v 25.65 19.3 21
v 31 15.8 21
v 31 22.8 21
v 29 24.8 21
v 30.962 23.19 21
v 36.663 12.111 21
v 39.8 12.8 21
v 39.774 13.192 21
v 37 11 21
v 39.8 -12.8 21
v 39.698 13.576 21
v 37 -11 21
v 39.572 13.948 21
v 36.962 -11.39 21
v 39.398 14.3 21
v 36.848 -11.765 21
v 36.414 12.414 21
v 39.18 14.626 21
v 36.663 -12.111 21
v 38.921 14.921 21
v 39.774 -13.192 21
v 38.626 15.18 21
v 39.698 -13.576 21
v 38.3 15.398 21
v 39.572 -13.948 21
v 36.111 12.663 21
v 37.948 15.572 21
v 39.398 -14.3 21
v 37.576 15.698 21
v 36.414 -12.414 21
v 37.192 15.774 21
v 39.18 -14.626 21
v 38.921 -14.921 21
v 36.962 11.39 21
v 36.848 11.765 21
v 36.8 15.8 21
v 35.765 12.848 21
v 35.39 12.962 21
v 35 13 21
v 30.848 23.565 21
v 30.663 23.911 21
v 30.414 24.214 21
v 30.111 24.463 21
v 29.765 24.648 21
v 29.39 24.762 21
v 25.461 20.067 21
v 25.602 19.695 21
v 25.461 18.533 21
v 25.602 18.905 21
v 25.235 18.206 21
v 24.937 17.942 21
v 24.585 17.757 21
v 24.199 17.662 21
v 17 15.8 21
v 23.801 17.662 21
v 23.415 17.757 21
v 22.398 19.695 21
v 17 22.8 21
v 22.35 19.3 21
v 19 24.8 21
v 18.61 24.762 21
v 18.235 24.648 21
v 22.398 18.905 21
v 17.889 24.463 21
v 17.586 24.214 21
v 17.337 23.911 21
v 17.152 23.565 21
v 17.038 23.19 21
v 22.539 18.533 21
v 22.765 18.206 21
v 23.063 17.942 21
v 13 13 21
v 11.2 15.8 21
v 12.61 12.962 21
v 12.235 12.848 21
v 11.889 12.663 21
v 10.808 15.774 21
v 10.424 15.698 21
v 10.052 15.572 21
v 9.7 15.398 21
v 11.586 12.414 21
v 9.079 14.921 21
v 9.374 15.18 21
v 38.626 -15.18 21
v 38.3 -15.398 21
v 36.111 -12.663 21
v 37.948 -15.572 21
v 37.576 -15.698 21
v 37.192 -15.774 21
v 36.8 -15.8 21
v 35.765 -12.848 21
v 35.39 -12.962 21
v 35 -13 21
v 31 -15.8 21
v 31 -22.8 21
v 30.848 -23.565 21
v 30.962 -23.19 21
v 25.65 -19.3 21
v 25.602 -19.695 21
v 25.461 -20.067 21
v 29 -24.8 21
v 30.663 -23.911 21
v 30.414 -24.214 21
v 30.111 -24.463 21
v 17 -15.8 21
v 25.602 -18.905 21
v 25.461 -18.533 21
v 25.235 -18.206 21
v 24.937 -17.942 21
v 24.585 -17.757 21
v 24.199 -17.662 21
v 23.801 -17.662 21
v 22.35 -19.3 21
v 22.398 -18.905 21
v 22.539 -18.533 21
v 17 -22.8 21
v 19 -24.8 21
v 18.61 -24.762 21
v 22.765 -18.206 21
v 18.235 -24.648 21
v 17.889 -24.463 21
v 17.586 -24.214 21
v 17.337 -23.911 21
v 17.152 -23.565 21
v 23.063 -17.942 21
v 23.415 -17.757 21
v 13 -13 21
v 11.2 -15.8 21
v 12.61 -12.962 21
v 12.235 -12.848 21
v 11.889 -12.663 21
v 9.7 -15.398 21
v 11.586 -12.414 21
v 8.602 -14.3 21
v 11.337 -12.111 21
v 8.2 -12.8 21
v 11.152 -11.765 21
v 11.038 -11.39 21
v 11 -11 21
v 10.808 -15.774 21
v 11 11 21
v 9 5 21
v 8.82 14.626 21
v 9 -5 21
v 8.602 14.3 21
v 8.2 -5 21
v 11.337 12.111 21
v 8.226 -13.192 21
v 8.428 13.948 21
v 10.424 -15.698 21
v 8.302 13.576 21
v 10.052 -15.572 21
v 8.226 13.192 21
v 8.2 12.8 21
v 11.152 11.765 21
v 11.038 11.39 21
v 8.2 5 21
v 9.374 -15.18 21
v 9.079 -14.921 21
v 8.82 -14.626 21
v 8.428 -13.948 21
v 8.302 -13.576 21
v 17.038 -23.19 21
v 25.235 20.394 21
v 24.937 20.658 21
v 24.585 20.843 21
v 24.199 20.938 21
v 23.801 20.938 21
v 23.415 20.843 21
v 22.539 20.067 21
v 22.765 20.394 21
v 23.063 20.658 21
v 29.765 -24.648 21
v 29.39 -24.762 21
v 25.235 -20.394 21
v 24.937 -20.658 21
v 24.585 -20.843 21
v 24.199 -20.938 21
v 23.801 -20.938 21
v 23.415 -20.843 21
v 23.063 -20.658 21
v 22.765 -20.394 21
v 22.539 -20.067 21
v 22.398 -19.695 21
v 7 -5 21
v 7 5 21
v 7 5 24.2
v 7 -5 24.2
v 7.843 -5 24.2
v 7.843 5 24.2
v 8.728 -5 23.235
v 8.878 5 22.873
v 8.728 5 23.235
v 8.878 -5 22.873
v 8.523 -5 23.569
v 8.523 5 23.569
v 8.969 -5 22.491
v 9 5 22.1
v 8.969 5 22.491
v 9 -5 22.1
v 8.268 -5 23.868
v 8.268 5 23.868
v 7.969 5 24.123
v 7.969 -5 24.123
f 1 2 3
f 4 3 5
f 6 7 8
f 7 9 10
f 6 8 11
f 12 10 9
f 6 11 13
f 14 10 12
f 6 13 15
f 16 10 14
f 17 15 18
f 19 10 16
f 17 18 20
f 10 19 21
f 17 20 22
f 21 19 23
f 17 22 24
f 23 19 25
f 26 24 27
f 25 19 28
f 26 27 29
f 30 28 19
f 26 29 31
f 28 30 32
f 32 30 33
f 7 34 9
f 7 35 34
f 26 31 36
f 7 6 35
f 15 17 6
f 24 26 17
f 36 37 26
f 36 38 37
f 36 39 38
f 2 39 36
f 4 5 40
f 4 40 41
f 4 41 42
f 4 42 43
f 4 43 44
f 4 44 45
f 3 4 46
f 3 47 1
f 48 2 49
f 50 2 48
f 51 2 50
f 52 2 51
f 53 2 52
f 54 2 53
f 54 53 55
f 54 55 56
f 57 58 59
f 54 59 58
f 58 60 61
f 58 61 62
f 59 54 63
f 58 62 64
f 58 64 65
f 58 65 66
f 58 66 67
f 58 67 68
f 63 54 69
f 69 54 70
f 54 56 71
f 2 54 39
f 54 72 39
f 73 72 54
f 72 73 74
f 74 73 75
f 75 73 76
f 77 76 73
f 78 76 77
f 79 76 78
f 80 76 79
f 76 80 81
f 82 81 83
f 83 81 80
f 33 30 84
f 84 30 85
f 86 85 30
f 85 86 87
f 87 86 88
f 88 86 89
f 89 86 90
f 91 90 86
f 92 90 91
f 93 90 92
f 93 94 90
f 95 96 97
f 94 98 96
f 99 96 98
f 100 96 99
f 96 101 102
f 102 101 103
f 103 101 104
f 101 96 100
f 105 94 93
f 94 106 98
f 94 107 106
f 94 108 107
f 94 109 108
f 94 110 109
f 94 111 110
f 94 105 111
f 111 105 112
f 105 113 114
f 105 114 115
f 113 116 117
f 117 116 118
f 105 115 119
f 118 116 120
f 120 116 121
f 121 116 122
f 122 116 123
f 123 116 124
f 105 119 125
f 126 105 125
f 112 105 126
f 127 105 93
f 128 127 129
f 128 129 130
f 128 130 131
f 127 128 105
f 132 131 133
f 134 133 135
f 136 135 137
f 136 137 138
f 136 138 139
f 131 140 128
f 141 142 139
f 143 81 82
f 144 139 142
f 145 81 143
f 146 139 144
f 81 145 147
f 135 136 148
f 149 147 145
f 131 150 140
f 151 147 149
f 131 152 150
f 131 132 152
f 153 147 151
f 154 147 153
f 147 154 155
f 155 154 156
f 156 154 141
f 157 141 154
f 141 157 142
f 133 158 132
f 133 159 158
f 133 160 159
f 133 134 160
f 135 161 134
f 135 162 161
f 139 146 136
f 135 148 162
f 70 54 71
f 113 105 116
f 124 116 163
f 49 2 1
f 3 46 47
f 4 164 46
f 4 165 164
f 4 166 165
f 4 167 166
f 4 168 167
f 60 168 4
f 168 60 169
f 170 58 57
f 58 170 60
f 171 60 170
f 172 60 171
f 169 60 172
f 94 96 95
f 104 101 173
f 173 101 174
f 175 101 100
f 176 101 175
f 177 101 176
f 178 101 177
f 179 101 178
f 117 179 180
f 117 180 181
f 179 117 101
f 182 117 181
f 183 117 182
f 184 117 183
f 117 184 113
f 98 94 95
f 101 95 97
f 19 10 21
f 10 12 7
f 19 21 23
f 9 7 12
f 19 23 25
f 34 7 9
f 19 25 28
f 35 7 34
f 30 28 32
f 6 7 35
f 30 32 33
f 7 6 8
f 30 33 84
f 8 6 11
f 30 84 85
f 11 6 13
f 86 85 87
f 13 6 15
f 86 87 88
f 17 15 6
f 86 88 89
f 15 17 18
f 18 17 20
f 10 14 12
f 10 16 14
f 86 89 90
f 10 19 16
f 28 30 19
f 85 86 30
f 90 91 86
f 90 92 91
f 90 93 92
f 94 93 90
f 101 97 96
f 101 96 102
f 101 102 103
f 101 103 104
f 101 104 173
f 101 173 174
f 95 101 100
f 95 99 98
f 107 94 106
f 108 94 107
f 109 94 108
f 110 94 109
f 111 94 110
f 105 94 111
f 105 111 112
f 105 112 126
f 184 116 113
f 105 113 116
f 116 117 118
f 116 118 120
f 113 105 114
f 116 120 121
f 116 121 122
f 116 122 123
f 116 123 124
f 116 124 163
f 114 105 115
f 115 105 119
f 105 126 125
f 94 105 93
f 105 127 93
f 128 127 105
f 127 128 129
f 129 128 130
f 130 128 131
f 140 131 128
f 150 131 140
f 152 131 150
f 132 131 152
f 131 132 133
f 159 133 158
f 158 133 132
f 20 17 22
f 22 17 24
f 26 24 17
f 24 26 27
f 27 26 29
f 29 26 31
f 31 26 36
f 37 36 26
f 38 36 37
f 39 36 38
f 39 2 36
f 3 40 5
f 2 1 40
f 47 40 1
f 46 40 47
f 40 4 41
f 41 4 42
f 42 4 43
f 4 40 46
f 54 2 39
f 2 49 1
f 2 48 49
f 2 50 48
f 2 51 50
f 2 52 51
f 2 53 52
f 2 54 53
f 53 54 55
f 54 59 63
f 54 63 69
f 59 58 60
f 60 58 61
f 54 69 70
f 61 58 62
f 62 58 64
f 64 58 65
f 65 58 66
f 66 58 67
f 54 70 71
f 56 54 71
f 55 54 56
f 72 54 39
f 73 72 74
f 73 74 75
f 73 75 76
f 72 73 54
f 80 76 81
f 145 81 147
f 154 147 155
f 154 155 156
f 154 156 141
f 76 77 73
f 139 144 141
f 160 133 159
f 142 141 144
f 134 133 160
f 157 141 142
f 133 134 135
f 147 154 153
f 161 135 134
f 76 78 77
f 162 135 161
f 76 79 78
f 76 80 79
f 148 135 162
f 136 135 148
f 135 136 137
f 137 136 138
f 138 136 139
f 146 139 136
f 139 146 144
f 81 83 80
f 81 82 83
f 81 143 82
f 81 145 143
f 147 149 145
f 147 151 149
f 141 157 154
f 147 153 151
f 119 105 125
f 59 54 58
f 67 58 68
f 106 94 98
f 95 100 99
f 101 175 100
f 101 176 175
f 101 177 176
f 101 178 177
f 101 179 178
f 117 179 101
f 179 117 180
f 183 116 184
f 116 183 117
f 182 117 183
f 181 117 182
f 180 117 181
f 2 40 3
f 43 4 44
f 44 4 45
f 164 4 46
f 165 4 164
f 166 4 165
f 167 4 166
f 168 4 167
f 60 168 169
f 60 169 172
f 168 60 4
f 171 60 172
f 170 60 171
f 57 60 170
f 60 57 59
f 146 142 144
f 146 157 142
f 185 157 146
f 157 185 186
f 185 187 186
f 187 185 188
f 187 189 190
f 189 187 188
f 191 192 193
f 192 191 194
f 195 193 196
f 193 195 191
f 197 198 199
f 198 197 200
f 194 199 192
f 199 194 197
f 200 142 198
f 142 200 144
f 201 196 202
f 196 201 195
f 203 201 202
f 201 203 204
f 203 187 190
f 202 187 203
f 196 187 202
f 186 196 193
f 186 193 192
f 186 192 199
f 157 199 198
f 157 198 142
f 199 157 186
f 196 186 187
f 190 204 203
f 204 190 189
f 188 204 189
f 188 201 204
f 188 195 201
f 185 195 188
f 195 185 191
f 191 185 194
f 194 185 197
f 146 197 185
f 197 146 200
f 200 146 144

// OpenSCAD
// file: saddle_cap.scad
// =====================================================================
//  AquaFeeder -- tampa do berco (fecha o tubo contra a bracadeira)
//  Imprimir EM PE como sai daqui (perfil constante, zero suporte).
//  4x M3 x 16mm roscam direto na bracadeira.
// =====================================================================
include <common.scad>

brk_w       = 9;      // so cabe a janela livre do tubo (x 40..49)
cradle_wall = 4.0;
ear_u       = 6.6;
cr_out      = barrel_od/2 + cradle_wall;
bolt_z      = [brk_w/2];

module cap_profile() {
    difference() {
        union() {
            circle(r = cr_out);
            translate([-cr_out - ear_u, 0]) square([2*(cr_out + ear_u), 7]);
        }
        circle(r = barrel_od/2 + 0.3 + fit/2);
        translate([-40, -40]) square([80, 40]);   // remove tudo abaixo do eixo
    }
}

module saddle_cap() {
    difference() {
        linear_extrude(brk_w) cap_profile();
        for (z = bolt_z, s = [-1, 1])
            translate([s * (cr_out + ear_u/2), 8, z])
                rotate([90, 0, 0]) cylinder(d = m3_free + fit, h = 11);
    }
}

saddle_cap();
// file: bracket.scad
// =====================================================================
//  AquaFeeder -- bracadeira da borda do aquario + mastro + berco do tubo
//
//  A peca e um PERFIL CONSTANTE extrudado 40mm: imprima EM PE, como sai
//  deste arquivo. Zero suporte, zero overhang, maxima resistencia.
//
//  Sistema de coordenadas LOCAL (= orientacao de impressao):
//     x local = eixo Y da montagem  (positivo = para dentro do aquario)
//     y local = eixo Z da montagem  (0 = topo da borda do aquario)
//     z local = eixo X da montagem  (comprimento do tubo)
//
//  AJUSTE PRINCIPAL: mast_h define a altura do eixo do tubo acima da borda.
//  A calha termina ~36mm abaixo do eixo. Com mast_h=46 a saida fica ~10mm
//  ACIMA do nivel da borda. Aumente se seu aquario tem a agua muito alta.
// =====================================================================
include <common.scad>

brk_w      = 38;    // largura (ao longo do tubo) -- berco vai de x=11 a x=49
rim_slot   = 24;    // vao da garra (borda de ate ~22mm + parafuso)
jaw_t      = 5;
web_t      = 12;
mast_t     = 8;
mast_h     = 46;    // topo da borda -> eixo do tubo
tube_y     = 52;    // eixo do tubo, medido da face interna da borda
cradle_wall= 4.0;
arm_h      = 13;

cr_out = barrel_od/2 + cradle_wall;   // 14.4
ear_u  = 6.6;                         // saliencia das orelhas do berco
// A tampa do berco cabe so na janela livre do tubo (x 40..49), entao ha
// UM par de parafusos, no meio dessa janela: x=44.5 -> local z=33.5
bolt_z = [33.5];

// ---------------------------------------------------------------------
module brk_profile() {
  difference() {
    union() {
        // garra interna (lado da agua)
        translate([-1, -web_t - clamp_depth]) square([jaw_t + 1, clamp_depth]);
        // garra externa
        translate([-1 - rim_slot - jaw_t, -web_t - clamp_depth]) square([jaw_t, clamp_depth]);
        // teto da garra
        translate([-1 - rim_slot - jaw_t, -web_t]) square([rim_slot + 2*jaw_t + 1, web_t]);
        // boss da porca M4
        translate([-1 - rim_slot - jaw_t - 6, -36]) square([6.1, 15]);
        // mastro
        translate([-mast_t/2, 0]) square([mast_t, mast_h]);
        // reforco mastro/teto
        polygon([[-mast_t/2, 0], [-mast_t/2, 18], [-22, 0]]);
        // braco
        translate([-mast_t/2, mast_h - arm_h]) square([tube_y + mast_t/2, arm_h]);
        // reforco do braco
        polygon([[mast_t/2, mast_h - arm_h], [mast_t/2, 12], [24, mast_h - arm_h]]);
        // berco + orelhas dos parafusos da tampa
        translate([tube_y, mast_h]) circle(r = cr_out);
        translate([tube_y - cr_out - ear_u, mast_h - 7]) square([2*(cr_out + ear_u), 7]);
    }
    // furo do tubo e corte de tudo que passa do eixo (a tampa fecha por cima)
    translate([tube_y, mast_h]) circle(r = barrel_od/2 + 0.3 + fit/2);
    translate([tube_y - 40, mast_h]) square([80, 40]);
  }
}

module bracket() {
    difference() {
        linear_extrude(brk_w) brk_profile();

        // parafusos M3 que prendem a tampa do berco (roscados na peca)
        for (z = bolt_z, s = [-1, 1])
            translate([tube_y + s*(cr_out + ear_u/2), mast_h + 1, z])
                rotate([90, 0, 0]) cylinder(d = m3_tap, h = 9);

        // parafuso de aperto M4 + alojamento da porca
        translate([-1 - rim_slot - jaw_t - 7, -28, brk_w/2]) rotate([0, 90, 0]) {
            cylinder(d = m4_free + fit, h = 20);
            rotate([0, 0, 30]) nut_trap(m4_nut_af + 0.25, m4_nut_t + 0.2);
        }

        // fixacao da caixa de eletronica no mastro (M4 auto-atarraxante)
        for (v = [10, 26])
            translate([-mast_t/2 - 1, v, brk_w/2]) rotate([0, 90, 0])
                cylinder(d = 3.6, h = mast_t + 2);
    }
}

bracket();
// file: auger.scad
// =====================================================================
//  AquaFeeder -- rosca sem-fim (auger)
//  Imprimir EM PE (como esta), cubo para baixo. Sem suporte.
//  0.2 mm de camada / 3 paredes / 30% preenchimento / PETG
// =====================================================================
include <common.scad>

// helice: um setor de coroa circular extrudado com twist gera o helicoide.
// angulo do setor = 360 * espessura_da_aleta / passo
module auger_flight(len) {
    ang   = 360 * flight_t / auger_pitch;
    twist = -360 * len / auger_pitch;
    // slices menor = render mais rapido; 0.6mm por fatia ja fica liso
    linear_extrude(height = len, twist = twist, slices = ceil(len / 0.6), convexity = 8, $fn = 40)
        union() {
            circle(d = auger_core);
            intersection() {
                difference() {
                    circle(d = auger_od);
                    circle(d = auger_core - 3);   // encrava a aleta ~1.5mm no nucleo (mais forte)
                }
                pie(auger_od, ang);
            }
        }
}

// furo do parafuso de fixacao do eixo + rebaixo p/ a cabeca na boca externa.
// Desenhado ao longo de +Z: a boca fica na superficie do cubo (raio hub_d/2).
module shaft_screw() {
    cylinder(d = m3_tap, h = hub_d);                          // furo rosqueado
    translate([0, 0, hub_d/2 - n17_screw_head_h])
        cylinder(d = n17_screw_head_d, h = hub_d);            // rebaixo da cabeca
}

module auger() {
    total = hub_len + auger_len + stub_len;
    difference() {
        union() {
            cylinder(d = hub_d, h = hub_len);                          // mancal dianteiro
            cylinder(d = auger_core, h = hub_len + auger_len);         // nucleo
            translate([0, 0, hub_len]) auger_flight(auger_len);        // helice
            translate([0, 0, hub_len + auger_len])                     // mancal traseiro
                cylinder(d = stub_d, h = stub_len);
        }
        // encaixe do eixo do motor
        if (motor_type == "NEMA17") {
            // Encaixe em "D": acompanha o achatado do eixo com folga de deslize
            // (ver n17_socket_c). A face plana pega o torque -- assim a rosca
            // encaixa firme e nao depende do parafuso para nao patinar.
            translate([0, 0, -eps])
                n17_dsocket(n17_socket_d + eps, n17_socket_c + fit/2);
            // DOIS parafusos M3 radiais a 90 graus: o em X cai sobre o achatado
            // (trava axial + reforca o aperto); o em Y e opcional. O torque quem
            // segura e o achatado do encaixe, nao os parafusos.
            translate([0, 0, 7])  rotate([0, 90, 0]) shaft_screw();
            translate([0, 0, 12]) rotate([90, 0, 0]) shaft_screw();
        } else {
            translate([0, 0, -eps]) dshaft(socket_depth + eps, 0.15 + fit/2);
        }

        // chanfro na base (evita pe de elefante travando no tubo)
        difference() {
            translate([0, 0, -eps]) cylinder(d = hub_d + 4, h = 0.9);
            cylinder(d1 = hub_d - 1.8, d2 = hub_d + 0.9, h = 1.0);
        }
    }
    // marca visual do sentido de giro (nao funcional)
}

auger();
// file: chute.scad
// =====================================================================
//  AquaFeeder -- calha de saida (encaixa por pressao no boss do tubo)
//  Joga a racao para frente e para longe do tubo (menos vapor subindo).
//  Imprimir COMO ESTA. Sem suporte. 3 paredes.
// =====================================================================
include <common.scad>

// Sensor de graos (opcional): abre dois furos de 3.4mm frente/tras para
// encaixar um LED IR de 3mm de um lado e um fototransistor do outro. O feixe
// atravessa o duto e cada grao que passa gera um pulso.
// Deixe false se nao vai usar sensor -- furo aberto deixa escapar racao.
sensor_holes = false;

// 5.6 fazia as paredes do socket baterem 0.6mm na barriga do tubo: a calha
// parava antes de assentar. Medido com cad/check_interferencia.scad.
socket_d = 4.8;                       // profundidade do encaixe
h_duct   = 26;                        // altura do duto
off_y    = 10;                        // deslocamento lateral (inclinacao)
sw       = 2.6;                       // parede do socket

sk_x = boss_x + 0.6 + 2*sw;           // 23.8
sk_y = boss_y + 0.6 + 2*sw;           // 26.8

module chute() {
    difference() {
        union() {
            translate([0, 0, h_duct]) rbox(sk_x, sk_y, socket_d, 3);
            hull() {
                translate([0, 0, h_duct - 0.01]) rbox(sk_x, sk_y, 0.01, 3);
                translate([0, off_y, 0])         rbox(22, 24, 0.01, 3);
            }
        }
        // cavidade do encaixe
        translate([0, 0, h_duct - eps])
            rbox(boss_x + 0.5 + fit, boss_y + 0.5 + fit, socket_d + 1, 2);
        // covinhas que travam nas meias-esferas do tubo
        for (s = [-1, 1])
            translate([0, s * (boss_y + 0.5)/2, h_duct + 2.6]) sphere(r = 2.0);
        // duto interno
        hull() {
            translate([0, 0, h_duct - 0.01]) rbox(boss_x + 0.5, boss_y + 0.5, 0.02, 2);
            translate([0, off_y, -1])        rbox(15.5, 17, 1.02, 2);
        }
        // furos do sensor optico (atravessam o duto)
        if (sensor_holes)
            translate([-16, off_y/2, 13]) rotate([0, 90, 0]) cylinder(d = 3.4, h = 32);
    }
}

chute();
// file: hopper.scad
// =====================================================================
//  AquaFeeder -- funil (reservatorio de racao) ~300 ml
//  Imprimir COMO ESTA (spigot para baixo). SEM SUPORTE.
//  PETG, 0.2mm, 3 paredes, 15% -- paredes finas, nao precisa forca.
//
//  ATENCAO: esta e a UNICA peca que pede suporte, e so embaixo do flange
//  (uma aba de 3,2mm que salta 13mm do pescoco, a 10mm da mesa). Area pequena
//  e plana, facil de tirar. Ja tentei eliminar com um chanfro de 40 graus, mas
//  isso obrigava as orelhas do colar a subir e elas colidiam com o chanfro --
//  ver cad/check_interferencia.scad.
// =====================================================================
include <common.scad>

// z = 0 e a face INFERIOR do flange (o que apoia nas orelhas do colar)
spig_z0   = -hop_spig_h;                 // -19
body_z0   = hop_flg_t;                   // 3.2
body_z1   = body_z0 + hop_taper_h;       // 98.2
rim_z0    = body_z1;
rim_z1    = body_z1 + hop_rim;

in_bot    = hop_bot - 2*hop_wall;        // 21.2
in_top    = hop_top - 2*hop_wall;        // 81.6

module hopper() {
    difference() {
        union() {
            // spigot: entra no socket do colar
            translate([0, 0, spig_z0]) rbox(hop_bot, hop_bot, hop_insert, 3);
            // flange (apoia no topo do colar; pede suporte embaixo)
            rbox(hop_flg_x, hop_flg_y, hop_flg_t, 3);
            // corpo troncoconico
            translate([0, 0, body_z0])
                linear_extrude(hop_taper_h, scale = hop_top / hop_bot)
                    rrect(hop_bot, hop_bot, 3);
            // aro de reforco no topo. O chanfro comeca EXATAMENTE na superficie
            // do corpo (86mm), senao sobra um degrau virado para baixo e o
            // fatiador pede suporte ali.
            hull() {
                translate([0, 0, rim_z0 - 0.01])
                    linear_extrude(0.01) rrect(hop_top, hop_top, 8);
                translate([0, 0, rim_z0 + hop_rim_ch])
                    linear_extrude(0.01) rrect(hop_top + 4, hop_top + 4, 8);
            }
            translate([0, 0, rim_z0 + hop_rim_ch]) linear_extrude(hop_rim)
                rrect(hop_top + 4, hop_top + 4, 8);
        }
        // cavidade reta no pescoco (spigot + chanfro + flange)
        translate([0, 0, spig_z0 - 1])
            rbox(in_bot, in_bot, hop_spig_h + hop_flg_t + 1, 2);
        // cavidade troncoconica
        translate([0, 0, body_z0 - eps])
            linear_extrude(hop_taper_h + hop_rim_ch + hop_rim + 2*eps,
                           scale = in_top / in_bot)
                rrect(in_bot, in_bot, 2);
        // furos M3 -> orelhas do colar (parafuso cabeca panela, sem rebaixo)
        for (s = [-1, 1])
            translate([0, s * lug_y, -1])
                cylinder(d = m3_free + fit, h = hop_flg_t + 2);
    }
}

hopper();
// file: barrel.scad
// =====================================================================
//  AquaFeeder -- tubo transportador, partido ao meio no plano y=0
//
//  openscad -o barrel_a.stl -D 'PART="A"' barrel.scad
//  openscad -o barrel_b.stl -D 'PART="B"' barrel.scad
//
//  A = metade com roscas M3 (furo 2.55)   B = metade com furos passantes
//  Imprimir com a face plana na mesa (a orientacao ja sai pronta). SEM SUPORTE.
//  4 paredes / 25% / PETG.
// =====================================================================
include <common.scad>

PART  = "A";
PRINT = true;

ear_z0   = 5;
ear_z1   = barrel_od/2 + ear_out;
ear_screw_z = 15.5;
outlet_cx   = outlet_x0 + outlet_len/2;
boss_z0     = -barrel_od/2 - boss_h;

// posicao das orelhas: [x0, lado]  (+1 = topo, -1 = fundo)
ears = [[0, 1], [0, -1], [barrel_len - ear_w, 1]];

// ---------------------------------------------------------------------
module ear(x0, s) {
    rotate([90, 0, 0])
        linear_extrude(height = 2*ear_t, center = true)
            translate([x0 + ear_w/2, s * (ear_z0 + ear_z1)/2])
                rrect(ear_w, ear_z1 - ear_z0, 2.5);
}

module ear_screw(x0, s, part) {
    translate([x0 + ear_w/2, 0, s * ear_screw_z]) rotate([-90, 0, 0]) {
        if (part == "A") {
            translate([0, 0, -0.2]) cylinder(d = m3_tap, h = ear_t + 0.4);
        } else {
            translate([0, 0, -ear_t - 0.2]) cylinder(d = m3_free + fit, h = ear_t + 0.4);
            translate([0, 0, -ear_t - 0.2]) cylinder(d = m3_head, h = m3_head_h + 0.2);
        }
    }
}

// ---------------------------------------------------------------------
// Fixacao do motor -- muda conforme motor_type (ver common.scad)
module motor_plate() {
    if (motor_type == "NEMA17") {
        translate([-n17_plate_t, 0, 0]) rotate([0, 90, 0])
            linear_extrude(n17_plate_t) rrect(n17_plate, n17_plate, 5);
    } else {
        translate([-plate_t, 0, plate_dz]) rotate([0, 90, 0])
            linear_extrude(plate_t) rrect(plate_h, plate_w, 4);
    }
}

module motor_cuts() {
    if (motor_type == "NEMA17") {
        xcyl(n17_shaft_d + 1.2, -n17_plate_t - 1, 1.0);                    // eixo
        xcyl(n17_boss_d + fit, -n17_plate_t - eps, -n17_plate_t + n17_boss_h);
        // 4 furos M3: o parafuso entra por dentro e rosca no proprio motor
        for (sy = [-1, 1], sz = [-1, 1])
            translate([-n17_plate_t - 1, sy * n17_hole_p/2, sz * n17_hole_p/2])
                rotate([0, 90, 0]) cylinder(d = n17_hole_d + fit, h = n17_plate_t + 2);
    } else {
        xcyl(m_shaft_d + 1.0, -plate_t - 1, 1.0);
        xcyl(m_boss_d + 0.6, -plate_t - eps, -plate_t + m_boss_h);
        for (s = [-1, 1])
            translate([-plate_t - 1, s * m_hole_pitch/2, 0])
                rotate([0, 90, 0]) cylinder(d = m_hole_d + fit, h = plate_t + 2);
    }
}

module collar() {
    // colar (socket do funil)
    translate([collar_cx, 0, collar_z0])
        linear_extrude(collar_z1 - collar_z0)
            rrect(socket_sq + 2*collar_wall, socket_sq + 2*collar_wall, 3);
    // orelhas laterais que recebem o flange do funil. Nascem da parede
    // externa do colar (y = 13..15.8), por isso a primeira camada da orelha
    // ja tem material embaixo na impressao.
    for (s = [-1, 1])
        translate([collar_cx, s * lug_y, lug_top - lug_t])
            rbox(14, 11, lug_t, 2);
}

module outlet_boss() {
    translate([outlet_cx, 0, boss_z0])
        linear_extrude(boss_h + 6) rrect(boss_x, boss_y, 2);
    // meias-esferas de retencao da calha (uma em cada metade)
    for (s = [-1, 1])
        translate([outlet_cx, s * (boss_y/2 - 1.1), boss_z0 + 2.6]) sphere(r = 1.8);
}

// ---------------------------------------------------------------------
module barrel_solid() {
    union() {
        xcyl(barrel_od, 0, barrel_len);
        motor_plate();
        collar();
        outlet_boss();
        for (e = ears) ear(e[0], e[1]);
    }
}

module barrel_cuts(part) {
    // furo interno + bolsa do mancal traseiro
    xcyl(bore_d + fit, 0, bore_end);
    xcyl(stub_d + 0.8 + fit, bore_end, bore_end + stub_len + 0.4);

    // eixo, ressalto e furos do motor escolhido
    motor_cuts();

    // socket do funil + funil de transicao ate a janela de entrada
    translate([collar_cx, 0, 8])
        linear_extrude(collar_z1 - 8 + 1)
            rrect(socket_sq + fit, socket_sq + fit, 2);
    hull() {
        translate([collar_cx, 0, 8 - 0.1])
            linear_extrude(0.1) rrect(socket_sq + fit, socket_sq + fit, 2);
        translate([collar_cx, 0, 1.5])
            linear_extrude(0.1) rrect(inlet_len, inlet_w, 2);
    }

    // saida (fundo)
    translate([outlet_cx, 0, -12])
        cube([outlet_len, outlet_w, 14], center = true);

    // roscas M3 das orelhas do colar (flange do funil entra por cima)
    for (s = [-1, 1])
        translate([collar_cx, s * lug_y, lug_top + 0.2])
            rotate([180, 0, 0]) cylinder(d = m3_tap, h = lug_t - 0.6);

    // parafusos que unem as metades
    for (e = ears) ear_screw(e[0], e[1], part);
}

module half_space(a) {
    translate([-80, a ? 0 : -200, -120]) cube([320, 200, 240]);
}

module barrel_half(part) {
    difference() {
        intersection() {
            barrel_solid();
            half_space(part == "A");
        }
        barrel_cuts(part);
    }
}

// ---------------------------------------------------------------------
if (PRINT)
    rotate([(PART == "A") ? 90 : -90, 0, 0]) barrel_half(PART);
else
    barrel_half(PART);
// main file
// =====================================================================
//  Teste de interferencia: as pecas ocupam o mesmo espaco?
//
//  Renderiza a INTERSECAO de dois conjuntos de pecas na posicao de
//  montagem. Se sair QUALQUER volume, ha colisao -- as pecas nao encaixam.
//
//    openscad -o /tmp/i.stl -D 'PAR="funil_tubo"' check_interferencia.scad
//
//  Volume esperado: ZERO (o STL sai vazio e o OpenSCAD avisa
//  "Current top level object is empty").
// =====================================================================
include <common.scad>
use <barrel.scad>
use <hopper.scad>
use <chute.scad>
use <auger.scad>
use <bracket.scad>
use <saddle_cap.scad>

PAR = "funil_tubo";

module tubo() {
    barrel_half("A");
    barrel_half("B");
}
module funil() {
    translate([collar_cx, 0, lug_top]) hopper();
}
module rosca() {
    translate([0.6, 0, 0]) rotate([0, 90, 0]) auger();
}
module calha() {
    // topo da calha (h_duct+socket_d = 30.8) encosta na barriga do tubo (-barrel_od/2).
    // Paramétrico p/ acompanhar o tubo se auger_od/barrel_od mudarem.
    translate([outlet_x0 + outlet_len/2, 0, -barrel_od/2 - 30.8]) chute();
}
// posicao da bracadeira depende do motor (ver zonas livres em common.scad)
brk_x = (motor_type == "NEMA17") ? 24 : 11;
cap_x = (motor_type == "NEMA17") ? 53 : 40;
module suporte() {
    translate([brk_x, -52, -46]) rotate([90, 0, 90]) bracket();
    translate([cap_x, 0, 0]) rotate([90, 0, 90]) saddle_cap();
}

intersection() {
    if      (PAR == "funil_tubo")  funil();
    else if (PAR == "rosca_tubo")  rosca();
    else if (PAR == "calha_tubo")  calha();
    else if (PAR == "suporte_tubo") suporte();
    else if (PAR == "funil_suporte") funil();

    if      (PAR == "funil_tubo")   tubo();
    else if (PAR == "rosca_tubo")   tubo();
    else if (PAR == "calha_tubo")   tubo();
    else if (PAR == "suporte_tubo") tubo();
    else if (PAR == "funil_suporte") suporte();
}
